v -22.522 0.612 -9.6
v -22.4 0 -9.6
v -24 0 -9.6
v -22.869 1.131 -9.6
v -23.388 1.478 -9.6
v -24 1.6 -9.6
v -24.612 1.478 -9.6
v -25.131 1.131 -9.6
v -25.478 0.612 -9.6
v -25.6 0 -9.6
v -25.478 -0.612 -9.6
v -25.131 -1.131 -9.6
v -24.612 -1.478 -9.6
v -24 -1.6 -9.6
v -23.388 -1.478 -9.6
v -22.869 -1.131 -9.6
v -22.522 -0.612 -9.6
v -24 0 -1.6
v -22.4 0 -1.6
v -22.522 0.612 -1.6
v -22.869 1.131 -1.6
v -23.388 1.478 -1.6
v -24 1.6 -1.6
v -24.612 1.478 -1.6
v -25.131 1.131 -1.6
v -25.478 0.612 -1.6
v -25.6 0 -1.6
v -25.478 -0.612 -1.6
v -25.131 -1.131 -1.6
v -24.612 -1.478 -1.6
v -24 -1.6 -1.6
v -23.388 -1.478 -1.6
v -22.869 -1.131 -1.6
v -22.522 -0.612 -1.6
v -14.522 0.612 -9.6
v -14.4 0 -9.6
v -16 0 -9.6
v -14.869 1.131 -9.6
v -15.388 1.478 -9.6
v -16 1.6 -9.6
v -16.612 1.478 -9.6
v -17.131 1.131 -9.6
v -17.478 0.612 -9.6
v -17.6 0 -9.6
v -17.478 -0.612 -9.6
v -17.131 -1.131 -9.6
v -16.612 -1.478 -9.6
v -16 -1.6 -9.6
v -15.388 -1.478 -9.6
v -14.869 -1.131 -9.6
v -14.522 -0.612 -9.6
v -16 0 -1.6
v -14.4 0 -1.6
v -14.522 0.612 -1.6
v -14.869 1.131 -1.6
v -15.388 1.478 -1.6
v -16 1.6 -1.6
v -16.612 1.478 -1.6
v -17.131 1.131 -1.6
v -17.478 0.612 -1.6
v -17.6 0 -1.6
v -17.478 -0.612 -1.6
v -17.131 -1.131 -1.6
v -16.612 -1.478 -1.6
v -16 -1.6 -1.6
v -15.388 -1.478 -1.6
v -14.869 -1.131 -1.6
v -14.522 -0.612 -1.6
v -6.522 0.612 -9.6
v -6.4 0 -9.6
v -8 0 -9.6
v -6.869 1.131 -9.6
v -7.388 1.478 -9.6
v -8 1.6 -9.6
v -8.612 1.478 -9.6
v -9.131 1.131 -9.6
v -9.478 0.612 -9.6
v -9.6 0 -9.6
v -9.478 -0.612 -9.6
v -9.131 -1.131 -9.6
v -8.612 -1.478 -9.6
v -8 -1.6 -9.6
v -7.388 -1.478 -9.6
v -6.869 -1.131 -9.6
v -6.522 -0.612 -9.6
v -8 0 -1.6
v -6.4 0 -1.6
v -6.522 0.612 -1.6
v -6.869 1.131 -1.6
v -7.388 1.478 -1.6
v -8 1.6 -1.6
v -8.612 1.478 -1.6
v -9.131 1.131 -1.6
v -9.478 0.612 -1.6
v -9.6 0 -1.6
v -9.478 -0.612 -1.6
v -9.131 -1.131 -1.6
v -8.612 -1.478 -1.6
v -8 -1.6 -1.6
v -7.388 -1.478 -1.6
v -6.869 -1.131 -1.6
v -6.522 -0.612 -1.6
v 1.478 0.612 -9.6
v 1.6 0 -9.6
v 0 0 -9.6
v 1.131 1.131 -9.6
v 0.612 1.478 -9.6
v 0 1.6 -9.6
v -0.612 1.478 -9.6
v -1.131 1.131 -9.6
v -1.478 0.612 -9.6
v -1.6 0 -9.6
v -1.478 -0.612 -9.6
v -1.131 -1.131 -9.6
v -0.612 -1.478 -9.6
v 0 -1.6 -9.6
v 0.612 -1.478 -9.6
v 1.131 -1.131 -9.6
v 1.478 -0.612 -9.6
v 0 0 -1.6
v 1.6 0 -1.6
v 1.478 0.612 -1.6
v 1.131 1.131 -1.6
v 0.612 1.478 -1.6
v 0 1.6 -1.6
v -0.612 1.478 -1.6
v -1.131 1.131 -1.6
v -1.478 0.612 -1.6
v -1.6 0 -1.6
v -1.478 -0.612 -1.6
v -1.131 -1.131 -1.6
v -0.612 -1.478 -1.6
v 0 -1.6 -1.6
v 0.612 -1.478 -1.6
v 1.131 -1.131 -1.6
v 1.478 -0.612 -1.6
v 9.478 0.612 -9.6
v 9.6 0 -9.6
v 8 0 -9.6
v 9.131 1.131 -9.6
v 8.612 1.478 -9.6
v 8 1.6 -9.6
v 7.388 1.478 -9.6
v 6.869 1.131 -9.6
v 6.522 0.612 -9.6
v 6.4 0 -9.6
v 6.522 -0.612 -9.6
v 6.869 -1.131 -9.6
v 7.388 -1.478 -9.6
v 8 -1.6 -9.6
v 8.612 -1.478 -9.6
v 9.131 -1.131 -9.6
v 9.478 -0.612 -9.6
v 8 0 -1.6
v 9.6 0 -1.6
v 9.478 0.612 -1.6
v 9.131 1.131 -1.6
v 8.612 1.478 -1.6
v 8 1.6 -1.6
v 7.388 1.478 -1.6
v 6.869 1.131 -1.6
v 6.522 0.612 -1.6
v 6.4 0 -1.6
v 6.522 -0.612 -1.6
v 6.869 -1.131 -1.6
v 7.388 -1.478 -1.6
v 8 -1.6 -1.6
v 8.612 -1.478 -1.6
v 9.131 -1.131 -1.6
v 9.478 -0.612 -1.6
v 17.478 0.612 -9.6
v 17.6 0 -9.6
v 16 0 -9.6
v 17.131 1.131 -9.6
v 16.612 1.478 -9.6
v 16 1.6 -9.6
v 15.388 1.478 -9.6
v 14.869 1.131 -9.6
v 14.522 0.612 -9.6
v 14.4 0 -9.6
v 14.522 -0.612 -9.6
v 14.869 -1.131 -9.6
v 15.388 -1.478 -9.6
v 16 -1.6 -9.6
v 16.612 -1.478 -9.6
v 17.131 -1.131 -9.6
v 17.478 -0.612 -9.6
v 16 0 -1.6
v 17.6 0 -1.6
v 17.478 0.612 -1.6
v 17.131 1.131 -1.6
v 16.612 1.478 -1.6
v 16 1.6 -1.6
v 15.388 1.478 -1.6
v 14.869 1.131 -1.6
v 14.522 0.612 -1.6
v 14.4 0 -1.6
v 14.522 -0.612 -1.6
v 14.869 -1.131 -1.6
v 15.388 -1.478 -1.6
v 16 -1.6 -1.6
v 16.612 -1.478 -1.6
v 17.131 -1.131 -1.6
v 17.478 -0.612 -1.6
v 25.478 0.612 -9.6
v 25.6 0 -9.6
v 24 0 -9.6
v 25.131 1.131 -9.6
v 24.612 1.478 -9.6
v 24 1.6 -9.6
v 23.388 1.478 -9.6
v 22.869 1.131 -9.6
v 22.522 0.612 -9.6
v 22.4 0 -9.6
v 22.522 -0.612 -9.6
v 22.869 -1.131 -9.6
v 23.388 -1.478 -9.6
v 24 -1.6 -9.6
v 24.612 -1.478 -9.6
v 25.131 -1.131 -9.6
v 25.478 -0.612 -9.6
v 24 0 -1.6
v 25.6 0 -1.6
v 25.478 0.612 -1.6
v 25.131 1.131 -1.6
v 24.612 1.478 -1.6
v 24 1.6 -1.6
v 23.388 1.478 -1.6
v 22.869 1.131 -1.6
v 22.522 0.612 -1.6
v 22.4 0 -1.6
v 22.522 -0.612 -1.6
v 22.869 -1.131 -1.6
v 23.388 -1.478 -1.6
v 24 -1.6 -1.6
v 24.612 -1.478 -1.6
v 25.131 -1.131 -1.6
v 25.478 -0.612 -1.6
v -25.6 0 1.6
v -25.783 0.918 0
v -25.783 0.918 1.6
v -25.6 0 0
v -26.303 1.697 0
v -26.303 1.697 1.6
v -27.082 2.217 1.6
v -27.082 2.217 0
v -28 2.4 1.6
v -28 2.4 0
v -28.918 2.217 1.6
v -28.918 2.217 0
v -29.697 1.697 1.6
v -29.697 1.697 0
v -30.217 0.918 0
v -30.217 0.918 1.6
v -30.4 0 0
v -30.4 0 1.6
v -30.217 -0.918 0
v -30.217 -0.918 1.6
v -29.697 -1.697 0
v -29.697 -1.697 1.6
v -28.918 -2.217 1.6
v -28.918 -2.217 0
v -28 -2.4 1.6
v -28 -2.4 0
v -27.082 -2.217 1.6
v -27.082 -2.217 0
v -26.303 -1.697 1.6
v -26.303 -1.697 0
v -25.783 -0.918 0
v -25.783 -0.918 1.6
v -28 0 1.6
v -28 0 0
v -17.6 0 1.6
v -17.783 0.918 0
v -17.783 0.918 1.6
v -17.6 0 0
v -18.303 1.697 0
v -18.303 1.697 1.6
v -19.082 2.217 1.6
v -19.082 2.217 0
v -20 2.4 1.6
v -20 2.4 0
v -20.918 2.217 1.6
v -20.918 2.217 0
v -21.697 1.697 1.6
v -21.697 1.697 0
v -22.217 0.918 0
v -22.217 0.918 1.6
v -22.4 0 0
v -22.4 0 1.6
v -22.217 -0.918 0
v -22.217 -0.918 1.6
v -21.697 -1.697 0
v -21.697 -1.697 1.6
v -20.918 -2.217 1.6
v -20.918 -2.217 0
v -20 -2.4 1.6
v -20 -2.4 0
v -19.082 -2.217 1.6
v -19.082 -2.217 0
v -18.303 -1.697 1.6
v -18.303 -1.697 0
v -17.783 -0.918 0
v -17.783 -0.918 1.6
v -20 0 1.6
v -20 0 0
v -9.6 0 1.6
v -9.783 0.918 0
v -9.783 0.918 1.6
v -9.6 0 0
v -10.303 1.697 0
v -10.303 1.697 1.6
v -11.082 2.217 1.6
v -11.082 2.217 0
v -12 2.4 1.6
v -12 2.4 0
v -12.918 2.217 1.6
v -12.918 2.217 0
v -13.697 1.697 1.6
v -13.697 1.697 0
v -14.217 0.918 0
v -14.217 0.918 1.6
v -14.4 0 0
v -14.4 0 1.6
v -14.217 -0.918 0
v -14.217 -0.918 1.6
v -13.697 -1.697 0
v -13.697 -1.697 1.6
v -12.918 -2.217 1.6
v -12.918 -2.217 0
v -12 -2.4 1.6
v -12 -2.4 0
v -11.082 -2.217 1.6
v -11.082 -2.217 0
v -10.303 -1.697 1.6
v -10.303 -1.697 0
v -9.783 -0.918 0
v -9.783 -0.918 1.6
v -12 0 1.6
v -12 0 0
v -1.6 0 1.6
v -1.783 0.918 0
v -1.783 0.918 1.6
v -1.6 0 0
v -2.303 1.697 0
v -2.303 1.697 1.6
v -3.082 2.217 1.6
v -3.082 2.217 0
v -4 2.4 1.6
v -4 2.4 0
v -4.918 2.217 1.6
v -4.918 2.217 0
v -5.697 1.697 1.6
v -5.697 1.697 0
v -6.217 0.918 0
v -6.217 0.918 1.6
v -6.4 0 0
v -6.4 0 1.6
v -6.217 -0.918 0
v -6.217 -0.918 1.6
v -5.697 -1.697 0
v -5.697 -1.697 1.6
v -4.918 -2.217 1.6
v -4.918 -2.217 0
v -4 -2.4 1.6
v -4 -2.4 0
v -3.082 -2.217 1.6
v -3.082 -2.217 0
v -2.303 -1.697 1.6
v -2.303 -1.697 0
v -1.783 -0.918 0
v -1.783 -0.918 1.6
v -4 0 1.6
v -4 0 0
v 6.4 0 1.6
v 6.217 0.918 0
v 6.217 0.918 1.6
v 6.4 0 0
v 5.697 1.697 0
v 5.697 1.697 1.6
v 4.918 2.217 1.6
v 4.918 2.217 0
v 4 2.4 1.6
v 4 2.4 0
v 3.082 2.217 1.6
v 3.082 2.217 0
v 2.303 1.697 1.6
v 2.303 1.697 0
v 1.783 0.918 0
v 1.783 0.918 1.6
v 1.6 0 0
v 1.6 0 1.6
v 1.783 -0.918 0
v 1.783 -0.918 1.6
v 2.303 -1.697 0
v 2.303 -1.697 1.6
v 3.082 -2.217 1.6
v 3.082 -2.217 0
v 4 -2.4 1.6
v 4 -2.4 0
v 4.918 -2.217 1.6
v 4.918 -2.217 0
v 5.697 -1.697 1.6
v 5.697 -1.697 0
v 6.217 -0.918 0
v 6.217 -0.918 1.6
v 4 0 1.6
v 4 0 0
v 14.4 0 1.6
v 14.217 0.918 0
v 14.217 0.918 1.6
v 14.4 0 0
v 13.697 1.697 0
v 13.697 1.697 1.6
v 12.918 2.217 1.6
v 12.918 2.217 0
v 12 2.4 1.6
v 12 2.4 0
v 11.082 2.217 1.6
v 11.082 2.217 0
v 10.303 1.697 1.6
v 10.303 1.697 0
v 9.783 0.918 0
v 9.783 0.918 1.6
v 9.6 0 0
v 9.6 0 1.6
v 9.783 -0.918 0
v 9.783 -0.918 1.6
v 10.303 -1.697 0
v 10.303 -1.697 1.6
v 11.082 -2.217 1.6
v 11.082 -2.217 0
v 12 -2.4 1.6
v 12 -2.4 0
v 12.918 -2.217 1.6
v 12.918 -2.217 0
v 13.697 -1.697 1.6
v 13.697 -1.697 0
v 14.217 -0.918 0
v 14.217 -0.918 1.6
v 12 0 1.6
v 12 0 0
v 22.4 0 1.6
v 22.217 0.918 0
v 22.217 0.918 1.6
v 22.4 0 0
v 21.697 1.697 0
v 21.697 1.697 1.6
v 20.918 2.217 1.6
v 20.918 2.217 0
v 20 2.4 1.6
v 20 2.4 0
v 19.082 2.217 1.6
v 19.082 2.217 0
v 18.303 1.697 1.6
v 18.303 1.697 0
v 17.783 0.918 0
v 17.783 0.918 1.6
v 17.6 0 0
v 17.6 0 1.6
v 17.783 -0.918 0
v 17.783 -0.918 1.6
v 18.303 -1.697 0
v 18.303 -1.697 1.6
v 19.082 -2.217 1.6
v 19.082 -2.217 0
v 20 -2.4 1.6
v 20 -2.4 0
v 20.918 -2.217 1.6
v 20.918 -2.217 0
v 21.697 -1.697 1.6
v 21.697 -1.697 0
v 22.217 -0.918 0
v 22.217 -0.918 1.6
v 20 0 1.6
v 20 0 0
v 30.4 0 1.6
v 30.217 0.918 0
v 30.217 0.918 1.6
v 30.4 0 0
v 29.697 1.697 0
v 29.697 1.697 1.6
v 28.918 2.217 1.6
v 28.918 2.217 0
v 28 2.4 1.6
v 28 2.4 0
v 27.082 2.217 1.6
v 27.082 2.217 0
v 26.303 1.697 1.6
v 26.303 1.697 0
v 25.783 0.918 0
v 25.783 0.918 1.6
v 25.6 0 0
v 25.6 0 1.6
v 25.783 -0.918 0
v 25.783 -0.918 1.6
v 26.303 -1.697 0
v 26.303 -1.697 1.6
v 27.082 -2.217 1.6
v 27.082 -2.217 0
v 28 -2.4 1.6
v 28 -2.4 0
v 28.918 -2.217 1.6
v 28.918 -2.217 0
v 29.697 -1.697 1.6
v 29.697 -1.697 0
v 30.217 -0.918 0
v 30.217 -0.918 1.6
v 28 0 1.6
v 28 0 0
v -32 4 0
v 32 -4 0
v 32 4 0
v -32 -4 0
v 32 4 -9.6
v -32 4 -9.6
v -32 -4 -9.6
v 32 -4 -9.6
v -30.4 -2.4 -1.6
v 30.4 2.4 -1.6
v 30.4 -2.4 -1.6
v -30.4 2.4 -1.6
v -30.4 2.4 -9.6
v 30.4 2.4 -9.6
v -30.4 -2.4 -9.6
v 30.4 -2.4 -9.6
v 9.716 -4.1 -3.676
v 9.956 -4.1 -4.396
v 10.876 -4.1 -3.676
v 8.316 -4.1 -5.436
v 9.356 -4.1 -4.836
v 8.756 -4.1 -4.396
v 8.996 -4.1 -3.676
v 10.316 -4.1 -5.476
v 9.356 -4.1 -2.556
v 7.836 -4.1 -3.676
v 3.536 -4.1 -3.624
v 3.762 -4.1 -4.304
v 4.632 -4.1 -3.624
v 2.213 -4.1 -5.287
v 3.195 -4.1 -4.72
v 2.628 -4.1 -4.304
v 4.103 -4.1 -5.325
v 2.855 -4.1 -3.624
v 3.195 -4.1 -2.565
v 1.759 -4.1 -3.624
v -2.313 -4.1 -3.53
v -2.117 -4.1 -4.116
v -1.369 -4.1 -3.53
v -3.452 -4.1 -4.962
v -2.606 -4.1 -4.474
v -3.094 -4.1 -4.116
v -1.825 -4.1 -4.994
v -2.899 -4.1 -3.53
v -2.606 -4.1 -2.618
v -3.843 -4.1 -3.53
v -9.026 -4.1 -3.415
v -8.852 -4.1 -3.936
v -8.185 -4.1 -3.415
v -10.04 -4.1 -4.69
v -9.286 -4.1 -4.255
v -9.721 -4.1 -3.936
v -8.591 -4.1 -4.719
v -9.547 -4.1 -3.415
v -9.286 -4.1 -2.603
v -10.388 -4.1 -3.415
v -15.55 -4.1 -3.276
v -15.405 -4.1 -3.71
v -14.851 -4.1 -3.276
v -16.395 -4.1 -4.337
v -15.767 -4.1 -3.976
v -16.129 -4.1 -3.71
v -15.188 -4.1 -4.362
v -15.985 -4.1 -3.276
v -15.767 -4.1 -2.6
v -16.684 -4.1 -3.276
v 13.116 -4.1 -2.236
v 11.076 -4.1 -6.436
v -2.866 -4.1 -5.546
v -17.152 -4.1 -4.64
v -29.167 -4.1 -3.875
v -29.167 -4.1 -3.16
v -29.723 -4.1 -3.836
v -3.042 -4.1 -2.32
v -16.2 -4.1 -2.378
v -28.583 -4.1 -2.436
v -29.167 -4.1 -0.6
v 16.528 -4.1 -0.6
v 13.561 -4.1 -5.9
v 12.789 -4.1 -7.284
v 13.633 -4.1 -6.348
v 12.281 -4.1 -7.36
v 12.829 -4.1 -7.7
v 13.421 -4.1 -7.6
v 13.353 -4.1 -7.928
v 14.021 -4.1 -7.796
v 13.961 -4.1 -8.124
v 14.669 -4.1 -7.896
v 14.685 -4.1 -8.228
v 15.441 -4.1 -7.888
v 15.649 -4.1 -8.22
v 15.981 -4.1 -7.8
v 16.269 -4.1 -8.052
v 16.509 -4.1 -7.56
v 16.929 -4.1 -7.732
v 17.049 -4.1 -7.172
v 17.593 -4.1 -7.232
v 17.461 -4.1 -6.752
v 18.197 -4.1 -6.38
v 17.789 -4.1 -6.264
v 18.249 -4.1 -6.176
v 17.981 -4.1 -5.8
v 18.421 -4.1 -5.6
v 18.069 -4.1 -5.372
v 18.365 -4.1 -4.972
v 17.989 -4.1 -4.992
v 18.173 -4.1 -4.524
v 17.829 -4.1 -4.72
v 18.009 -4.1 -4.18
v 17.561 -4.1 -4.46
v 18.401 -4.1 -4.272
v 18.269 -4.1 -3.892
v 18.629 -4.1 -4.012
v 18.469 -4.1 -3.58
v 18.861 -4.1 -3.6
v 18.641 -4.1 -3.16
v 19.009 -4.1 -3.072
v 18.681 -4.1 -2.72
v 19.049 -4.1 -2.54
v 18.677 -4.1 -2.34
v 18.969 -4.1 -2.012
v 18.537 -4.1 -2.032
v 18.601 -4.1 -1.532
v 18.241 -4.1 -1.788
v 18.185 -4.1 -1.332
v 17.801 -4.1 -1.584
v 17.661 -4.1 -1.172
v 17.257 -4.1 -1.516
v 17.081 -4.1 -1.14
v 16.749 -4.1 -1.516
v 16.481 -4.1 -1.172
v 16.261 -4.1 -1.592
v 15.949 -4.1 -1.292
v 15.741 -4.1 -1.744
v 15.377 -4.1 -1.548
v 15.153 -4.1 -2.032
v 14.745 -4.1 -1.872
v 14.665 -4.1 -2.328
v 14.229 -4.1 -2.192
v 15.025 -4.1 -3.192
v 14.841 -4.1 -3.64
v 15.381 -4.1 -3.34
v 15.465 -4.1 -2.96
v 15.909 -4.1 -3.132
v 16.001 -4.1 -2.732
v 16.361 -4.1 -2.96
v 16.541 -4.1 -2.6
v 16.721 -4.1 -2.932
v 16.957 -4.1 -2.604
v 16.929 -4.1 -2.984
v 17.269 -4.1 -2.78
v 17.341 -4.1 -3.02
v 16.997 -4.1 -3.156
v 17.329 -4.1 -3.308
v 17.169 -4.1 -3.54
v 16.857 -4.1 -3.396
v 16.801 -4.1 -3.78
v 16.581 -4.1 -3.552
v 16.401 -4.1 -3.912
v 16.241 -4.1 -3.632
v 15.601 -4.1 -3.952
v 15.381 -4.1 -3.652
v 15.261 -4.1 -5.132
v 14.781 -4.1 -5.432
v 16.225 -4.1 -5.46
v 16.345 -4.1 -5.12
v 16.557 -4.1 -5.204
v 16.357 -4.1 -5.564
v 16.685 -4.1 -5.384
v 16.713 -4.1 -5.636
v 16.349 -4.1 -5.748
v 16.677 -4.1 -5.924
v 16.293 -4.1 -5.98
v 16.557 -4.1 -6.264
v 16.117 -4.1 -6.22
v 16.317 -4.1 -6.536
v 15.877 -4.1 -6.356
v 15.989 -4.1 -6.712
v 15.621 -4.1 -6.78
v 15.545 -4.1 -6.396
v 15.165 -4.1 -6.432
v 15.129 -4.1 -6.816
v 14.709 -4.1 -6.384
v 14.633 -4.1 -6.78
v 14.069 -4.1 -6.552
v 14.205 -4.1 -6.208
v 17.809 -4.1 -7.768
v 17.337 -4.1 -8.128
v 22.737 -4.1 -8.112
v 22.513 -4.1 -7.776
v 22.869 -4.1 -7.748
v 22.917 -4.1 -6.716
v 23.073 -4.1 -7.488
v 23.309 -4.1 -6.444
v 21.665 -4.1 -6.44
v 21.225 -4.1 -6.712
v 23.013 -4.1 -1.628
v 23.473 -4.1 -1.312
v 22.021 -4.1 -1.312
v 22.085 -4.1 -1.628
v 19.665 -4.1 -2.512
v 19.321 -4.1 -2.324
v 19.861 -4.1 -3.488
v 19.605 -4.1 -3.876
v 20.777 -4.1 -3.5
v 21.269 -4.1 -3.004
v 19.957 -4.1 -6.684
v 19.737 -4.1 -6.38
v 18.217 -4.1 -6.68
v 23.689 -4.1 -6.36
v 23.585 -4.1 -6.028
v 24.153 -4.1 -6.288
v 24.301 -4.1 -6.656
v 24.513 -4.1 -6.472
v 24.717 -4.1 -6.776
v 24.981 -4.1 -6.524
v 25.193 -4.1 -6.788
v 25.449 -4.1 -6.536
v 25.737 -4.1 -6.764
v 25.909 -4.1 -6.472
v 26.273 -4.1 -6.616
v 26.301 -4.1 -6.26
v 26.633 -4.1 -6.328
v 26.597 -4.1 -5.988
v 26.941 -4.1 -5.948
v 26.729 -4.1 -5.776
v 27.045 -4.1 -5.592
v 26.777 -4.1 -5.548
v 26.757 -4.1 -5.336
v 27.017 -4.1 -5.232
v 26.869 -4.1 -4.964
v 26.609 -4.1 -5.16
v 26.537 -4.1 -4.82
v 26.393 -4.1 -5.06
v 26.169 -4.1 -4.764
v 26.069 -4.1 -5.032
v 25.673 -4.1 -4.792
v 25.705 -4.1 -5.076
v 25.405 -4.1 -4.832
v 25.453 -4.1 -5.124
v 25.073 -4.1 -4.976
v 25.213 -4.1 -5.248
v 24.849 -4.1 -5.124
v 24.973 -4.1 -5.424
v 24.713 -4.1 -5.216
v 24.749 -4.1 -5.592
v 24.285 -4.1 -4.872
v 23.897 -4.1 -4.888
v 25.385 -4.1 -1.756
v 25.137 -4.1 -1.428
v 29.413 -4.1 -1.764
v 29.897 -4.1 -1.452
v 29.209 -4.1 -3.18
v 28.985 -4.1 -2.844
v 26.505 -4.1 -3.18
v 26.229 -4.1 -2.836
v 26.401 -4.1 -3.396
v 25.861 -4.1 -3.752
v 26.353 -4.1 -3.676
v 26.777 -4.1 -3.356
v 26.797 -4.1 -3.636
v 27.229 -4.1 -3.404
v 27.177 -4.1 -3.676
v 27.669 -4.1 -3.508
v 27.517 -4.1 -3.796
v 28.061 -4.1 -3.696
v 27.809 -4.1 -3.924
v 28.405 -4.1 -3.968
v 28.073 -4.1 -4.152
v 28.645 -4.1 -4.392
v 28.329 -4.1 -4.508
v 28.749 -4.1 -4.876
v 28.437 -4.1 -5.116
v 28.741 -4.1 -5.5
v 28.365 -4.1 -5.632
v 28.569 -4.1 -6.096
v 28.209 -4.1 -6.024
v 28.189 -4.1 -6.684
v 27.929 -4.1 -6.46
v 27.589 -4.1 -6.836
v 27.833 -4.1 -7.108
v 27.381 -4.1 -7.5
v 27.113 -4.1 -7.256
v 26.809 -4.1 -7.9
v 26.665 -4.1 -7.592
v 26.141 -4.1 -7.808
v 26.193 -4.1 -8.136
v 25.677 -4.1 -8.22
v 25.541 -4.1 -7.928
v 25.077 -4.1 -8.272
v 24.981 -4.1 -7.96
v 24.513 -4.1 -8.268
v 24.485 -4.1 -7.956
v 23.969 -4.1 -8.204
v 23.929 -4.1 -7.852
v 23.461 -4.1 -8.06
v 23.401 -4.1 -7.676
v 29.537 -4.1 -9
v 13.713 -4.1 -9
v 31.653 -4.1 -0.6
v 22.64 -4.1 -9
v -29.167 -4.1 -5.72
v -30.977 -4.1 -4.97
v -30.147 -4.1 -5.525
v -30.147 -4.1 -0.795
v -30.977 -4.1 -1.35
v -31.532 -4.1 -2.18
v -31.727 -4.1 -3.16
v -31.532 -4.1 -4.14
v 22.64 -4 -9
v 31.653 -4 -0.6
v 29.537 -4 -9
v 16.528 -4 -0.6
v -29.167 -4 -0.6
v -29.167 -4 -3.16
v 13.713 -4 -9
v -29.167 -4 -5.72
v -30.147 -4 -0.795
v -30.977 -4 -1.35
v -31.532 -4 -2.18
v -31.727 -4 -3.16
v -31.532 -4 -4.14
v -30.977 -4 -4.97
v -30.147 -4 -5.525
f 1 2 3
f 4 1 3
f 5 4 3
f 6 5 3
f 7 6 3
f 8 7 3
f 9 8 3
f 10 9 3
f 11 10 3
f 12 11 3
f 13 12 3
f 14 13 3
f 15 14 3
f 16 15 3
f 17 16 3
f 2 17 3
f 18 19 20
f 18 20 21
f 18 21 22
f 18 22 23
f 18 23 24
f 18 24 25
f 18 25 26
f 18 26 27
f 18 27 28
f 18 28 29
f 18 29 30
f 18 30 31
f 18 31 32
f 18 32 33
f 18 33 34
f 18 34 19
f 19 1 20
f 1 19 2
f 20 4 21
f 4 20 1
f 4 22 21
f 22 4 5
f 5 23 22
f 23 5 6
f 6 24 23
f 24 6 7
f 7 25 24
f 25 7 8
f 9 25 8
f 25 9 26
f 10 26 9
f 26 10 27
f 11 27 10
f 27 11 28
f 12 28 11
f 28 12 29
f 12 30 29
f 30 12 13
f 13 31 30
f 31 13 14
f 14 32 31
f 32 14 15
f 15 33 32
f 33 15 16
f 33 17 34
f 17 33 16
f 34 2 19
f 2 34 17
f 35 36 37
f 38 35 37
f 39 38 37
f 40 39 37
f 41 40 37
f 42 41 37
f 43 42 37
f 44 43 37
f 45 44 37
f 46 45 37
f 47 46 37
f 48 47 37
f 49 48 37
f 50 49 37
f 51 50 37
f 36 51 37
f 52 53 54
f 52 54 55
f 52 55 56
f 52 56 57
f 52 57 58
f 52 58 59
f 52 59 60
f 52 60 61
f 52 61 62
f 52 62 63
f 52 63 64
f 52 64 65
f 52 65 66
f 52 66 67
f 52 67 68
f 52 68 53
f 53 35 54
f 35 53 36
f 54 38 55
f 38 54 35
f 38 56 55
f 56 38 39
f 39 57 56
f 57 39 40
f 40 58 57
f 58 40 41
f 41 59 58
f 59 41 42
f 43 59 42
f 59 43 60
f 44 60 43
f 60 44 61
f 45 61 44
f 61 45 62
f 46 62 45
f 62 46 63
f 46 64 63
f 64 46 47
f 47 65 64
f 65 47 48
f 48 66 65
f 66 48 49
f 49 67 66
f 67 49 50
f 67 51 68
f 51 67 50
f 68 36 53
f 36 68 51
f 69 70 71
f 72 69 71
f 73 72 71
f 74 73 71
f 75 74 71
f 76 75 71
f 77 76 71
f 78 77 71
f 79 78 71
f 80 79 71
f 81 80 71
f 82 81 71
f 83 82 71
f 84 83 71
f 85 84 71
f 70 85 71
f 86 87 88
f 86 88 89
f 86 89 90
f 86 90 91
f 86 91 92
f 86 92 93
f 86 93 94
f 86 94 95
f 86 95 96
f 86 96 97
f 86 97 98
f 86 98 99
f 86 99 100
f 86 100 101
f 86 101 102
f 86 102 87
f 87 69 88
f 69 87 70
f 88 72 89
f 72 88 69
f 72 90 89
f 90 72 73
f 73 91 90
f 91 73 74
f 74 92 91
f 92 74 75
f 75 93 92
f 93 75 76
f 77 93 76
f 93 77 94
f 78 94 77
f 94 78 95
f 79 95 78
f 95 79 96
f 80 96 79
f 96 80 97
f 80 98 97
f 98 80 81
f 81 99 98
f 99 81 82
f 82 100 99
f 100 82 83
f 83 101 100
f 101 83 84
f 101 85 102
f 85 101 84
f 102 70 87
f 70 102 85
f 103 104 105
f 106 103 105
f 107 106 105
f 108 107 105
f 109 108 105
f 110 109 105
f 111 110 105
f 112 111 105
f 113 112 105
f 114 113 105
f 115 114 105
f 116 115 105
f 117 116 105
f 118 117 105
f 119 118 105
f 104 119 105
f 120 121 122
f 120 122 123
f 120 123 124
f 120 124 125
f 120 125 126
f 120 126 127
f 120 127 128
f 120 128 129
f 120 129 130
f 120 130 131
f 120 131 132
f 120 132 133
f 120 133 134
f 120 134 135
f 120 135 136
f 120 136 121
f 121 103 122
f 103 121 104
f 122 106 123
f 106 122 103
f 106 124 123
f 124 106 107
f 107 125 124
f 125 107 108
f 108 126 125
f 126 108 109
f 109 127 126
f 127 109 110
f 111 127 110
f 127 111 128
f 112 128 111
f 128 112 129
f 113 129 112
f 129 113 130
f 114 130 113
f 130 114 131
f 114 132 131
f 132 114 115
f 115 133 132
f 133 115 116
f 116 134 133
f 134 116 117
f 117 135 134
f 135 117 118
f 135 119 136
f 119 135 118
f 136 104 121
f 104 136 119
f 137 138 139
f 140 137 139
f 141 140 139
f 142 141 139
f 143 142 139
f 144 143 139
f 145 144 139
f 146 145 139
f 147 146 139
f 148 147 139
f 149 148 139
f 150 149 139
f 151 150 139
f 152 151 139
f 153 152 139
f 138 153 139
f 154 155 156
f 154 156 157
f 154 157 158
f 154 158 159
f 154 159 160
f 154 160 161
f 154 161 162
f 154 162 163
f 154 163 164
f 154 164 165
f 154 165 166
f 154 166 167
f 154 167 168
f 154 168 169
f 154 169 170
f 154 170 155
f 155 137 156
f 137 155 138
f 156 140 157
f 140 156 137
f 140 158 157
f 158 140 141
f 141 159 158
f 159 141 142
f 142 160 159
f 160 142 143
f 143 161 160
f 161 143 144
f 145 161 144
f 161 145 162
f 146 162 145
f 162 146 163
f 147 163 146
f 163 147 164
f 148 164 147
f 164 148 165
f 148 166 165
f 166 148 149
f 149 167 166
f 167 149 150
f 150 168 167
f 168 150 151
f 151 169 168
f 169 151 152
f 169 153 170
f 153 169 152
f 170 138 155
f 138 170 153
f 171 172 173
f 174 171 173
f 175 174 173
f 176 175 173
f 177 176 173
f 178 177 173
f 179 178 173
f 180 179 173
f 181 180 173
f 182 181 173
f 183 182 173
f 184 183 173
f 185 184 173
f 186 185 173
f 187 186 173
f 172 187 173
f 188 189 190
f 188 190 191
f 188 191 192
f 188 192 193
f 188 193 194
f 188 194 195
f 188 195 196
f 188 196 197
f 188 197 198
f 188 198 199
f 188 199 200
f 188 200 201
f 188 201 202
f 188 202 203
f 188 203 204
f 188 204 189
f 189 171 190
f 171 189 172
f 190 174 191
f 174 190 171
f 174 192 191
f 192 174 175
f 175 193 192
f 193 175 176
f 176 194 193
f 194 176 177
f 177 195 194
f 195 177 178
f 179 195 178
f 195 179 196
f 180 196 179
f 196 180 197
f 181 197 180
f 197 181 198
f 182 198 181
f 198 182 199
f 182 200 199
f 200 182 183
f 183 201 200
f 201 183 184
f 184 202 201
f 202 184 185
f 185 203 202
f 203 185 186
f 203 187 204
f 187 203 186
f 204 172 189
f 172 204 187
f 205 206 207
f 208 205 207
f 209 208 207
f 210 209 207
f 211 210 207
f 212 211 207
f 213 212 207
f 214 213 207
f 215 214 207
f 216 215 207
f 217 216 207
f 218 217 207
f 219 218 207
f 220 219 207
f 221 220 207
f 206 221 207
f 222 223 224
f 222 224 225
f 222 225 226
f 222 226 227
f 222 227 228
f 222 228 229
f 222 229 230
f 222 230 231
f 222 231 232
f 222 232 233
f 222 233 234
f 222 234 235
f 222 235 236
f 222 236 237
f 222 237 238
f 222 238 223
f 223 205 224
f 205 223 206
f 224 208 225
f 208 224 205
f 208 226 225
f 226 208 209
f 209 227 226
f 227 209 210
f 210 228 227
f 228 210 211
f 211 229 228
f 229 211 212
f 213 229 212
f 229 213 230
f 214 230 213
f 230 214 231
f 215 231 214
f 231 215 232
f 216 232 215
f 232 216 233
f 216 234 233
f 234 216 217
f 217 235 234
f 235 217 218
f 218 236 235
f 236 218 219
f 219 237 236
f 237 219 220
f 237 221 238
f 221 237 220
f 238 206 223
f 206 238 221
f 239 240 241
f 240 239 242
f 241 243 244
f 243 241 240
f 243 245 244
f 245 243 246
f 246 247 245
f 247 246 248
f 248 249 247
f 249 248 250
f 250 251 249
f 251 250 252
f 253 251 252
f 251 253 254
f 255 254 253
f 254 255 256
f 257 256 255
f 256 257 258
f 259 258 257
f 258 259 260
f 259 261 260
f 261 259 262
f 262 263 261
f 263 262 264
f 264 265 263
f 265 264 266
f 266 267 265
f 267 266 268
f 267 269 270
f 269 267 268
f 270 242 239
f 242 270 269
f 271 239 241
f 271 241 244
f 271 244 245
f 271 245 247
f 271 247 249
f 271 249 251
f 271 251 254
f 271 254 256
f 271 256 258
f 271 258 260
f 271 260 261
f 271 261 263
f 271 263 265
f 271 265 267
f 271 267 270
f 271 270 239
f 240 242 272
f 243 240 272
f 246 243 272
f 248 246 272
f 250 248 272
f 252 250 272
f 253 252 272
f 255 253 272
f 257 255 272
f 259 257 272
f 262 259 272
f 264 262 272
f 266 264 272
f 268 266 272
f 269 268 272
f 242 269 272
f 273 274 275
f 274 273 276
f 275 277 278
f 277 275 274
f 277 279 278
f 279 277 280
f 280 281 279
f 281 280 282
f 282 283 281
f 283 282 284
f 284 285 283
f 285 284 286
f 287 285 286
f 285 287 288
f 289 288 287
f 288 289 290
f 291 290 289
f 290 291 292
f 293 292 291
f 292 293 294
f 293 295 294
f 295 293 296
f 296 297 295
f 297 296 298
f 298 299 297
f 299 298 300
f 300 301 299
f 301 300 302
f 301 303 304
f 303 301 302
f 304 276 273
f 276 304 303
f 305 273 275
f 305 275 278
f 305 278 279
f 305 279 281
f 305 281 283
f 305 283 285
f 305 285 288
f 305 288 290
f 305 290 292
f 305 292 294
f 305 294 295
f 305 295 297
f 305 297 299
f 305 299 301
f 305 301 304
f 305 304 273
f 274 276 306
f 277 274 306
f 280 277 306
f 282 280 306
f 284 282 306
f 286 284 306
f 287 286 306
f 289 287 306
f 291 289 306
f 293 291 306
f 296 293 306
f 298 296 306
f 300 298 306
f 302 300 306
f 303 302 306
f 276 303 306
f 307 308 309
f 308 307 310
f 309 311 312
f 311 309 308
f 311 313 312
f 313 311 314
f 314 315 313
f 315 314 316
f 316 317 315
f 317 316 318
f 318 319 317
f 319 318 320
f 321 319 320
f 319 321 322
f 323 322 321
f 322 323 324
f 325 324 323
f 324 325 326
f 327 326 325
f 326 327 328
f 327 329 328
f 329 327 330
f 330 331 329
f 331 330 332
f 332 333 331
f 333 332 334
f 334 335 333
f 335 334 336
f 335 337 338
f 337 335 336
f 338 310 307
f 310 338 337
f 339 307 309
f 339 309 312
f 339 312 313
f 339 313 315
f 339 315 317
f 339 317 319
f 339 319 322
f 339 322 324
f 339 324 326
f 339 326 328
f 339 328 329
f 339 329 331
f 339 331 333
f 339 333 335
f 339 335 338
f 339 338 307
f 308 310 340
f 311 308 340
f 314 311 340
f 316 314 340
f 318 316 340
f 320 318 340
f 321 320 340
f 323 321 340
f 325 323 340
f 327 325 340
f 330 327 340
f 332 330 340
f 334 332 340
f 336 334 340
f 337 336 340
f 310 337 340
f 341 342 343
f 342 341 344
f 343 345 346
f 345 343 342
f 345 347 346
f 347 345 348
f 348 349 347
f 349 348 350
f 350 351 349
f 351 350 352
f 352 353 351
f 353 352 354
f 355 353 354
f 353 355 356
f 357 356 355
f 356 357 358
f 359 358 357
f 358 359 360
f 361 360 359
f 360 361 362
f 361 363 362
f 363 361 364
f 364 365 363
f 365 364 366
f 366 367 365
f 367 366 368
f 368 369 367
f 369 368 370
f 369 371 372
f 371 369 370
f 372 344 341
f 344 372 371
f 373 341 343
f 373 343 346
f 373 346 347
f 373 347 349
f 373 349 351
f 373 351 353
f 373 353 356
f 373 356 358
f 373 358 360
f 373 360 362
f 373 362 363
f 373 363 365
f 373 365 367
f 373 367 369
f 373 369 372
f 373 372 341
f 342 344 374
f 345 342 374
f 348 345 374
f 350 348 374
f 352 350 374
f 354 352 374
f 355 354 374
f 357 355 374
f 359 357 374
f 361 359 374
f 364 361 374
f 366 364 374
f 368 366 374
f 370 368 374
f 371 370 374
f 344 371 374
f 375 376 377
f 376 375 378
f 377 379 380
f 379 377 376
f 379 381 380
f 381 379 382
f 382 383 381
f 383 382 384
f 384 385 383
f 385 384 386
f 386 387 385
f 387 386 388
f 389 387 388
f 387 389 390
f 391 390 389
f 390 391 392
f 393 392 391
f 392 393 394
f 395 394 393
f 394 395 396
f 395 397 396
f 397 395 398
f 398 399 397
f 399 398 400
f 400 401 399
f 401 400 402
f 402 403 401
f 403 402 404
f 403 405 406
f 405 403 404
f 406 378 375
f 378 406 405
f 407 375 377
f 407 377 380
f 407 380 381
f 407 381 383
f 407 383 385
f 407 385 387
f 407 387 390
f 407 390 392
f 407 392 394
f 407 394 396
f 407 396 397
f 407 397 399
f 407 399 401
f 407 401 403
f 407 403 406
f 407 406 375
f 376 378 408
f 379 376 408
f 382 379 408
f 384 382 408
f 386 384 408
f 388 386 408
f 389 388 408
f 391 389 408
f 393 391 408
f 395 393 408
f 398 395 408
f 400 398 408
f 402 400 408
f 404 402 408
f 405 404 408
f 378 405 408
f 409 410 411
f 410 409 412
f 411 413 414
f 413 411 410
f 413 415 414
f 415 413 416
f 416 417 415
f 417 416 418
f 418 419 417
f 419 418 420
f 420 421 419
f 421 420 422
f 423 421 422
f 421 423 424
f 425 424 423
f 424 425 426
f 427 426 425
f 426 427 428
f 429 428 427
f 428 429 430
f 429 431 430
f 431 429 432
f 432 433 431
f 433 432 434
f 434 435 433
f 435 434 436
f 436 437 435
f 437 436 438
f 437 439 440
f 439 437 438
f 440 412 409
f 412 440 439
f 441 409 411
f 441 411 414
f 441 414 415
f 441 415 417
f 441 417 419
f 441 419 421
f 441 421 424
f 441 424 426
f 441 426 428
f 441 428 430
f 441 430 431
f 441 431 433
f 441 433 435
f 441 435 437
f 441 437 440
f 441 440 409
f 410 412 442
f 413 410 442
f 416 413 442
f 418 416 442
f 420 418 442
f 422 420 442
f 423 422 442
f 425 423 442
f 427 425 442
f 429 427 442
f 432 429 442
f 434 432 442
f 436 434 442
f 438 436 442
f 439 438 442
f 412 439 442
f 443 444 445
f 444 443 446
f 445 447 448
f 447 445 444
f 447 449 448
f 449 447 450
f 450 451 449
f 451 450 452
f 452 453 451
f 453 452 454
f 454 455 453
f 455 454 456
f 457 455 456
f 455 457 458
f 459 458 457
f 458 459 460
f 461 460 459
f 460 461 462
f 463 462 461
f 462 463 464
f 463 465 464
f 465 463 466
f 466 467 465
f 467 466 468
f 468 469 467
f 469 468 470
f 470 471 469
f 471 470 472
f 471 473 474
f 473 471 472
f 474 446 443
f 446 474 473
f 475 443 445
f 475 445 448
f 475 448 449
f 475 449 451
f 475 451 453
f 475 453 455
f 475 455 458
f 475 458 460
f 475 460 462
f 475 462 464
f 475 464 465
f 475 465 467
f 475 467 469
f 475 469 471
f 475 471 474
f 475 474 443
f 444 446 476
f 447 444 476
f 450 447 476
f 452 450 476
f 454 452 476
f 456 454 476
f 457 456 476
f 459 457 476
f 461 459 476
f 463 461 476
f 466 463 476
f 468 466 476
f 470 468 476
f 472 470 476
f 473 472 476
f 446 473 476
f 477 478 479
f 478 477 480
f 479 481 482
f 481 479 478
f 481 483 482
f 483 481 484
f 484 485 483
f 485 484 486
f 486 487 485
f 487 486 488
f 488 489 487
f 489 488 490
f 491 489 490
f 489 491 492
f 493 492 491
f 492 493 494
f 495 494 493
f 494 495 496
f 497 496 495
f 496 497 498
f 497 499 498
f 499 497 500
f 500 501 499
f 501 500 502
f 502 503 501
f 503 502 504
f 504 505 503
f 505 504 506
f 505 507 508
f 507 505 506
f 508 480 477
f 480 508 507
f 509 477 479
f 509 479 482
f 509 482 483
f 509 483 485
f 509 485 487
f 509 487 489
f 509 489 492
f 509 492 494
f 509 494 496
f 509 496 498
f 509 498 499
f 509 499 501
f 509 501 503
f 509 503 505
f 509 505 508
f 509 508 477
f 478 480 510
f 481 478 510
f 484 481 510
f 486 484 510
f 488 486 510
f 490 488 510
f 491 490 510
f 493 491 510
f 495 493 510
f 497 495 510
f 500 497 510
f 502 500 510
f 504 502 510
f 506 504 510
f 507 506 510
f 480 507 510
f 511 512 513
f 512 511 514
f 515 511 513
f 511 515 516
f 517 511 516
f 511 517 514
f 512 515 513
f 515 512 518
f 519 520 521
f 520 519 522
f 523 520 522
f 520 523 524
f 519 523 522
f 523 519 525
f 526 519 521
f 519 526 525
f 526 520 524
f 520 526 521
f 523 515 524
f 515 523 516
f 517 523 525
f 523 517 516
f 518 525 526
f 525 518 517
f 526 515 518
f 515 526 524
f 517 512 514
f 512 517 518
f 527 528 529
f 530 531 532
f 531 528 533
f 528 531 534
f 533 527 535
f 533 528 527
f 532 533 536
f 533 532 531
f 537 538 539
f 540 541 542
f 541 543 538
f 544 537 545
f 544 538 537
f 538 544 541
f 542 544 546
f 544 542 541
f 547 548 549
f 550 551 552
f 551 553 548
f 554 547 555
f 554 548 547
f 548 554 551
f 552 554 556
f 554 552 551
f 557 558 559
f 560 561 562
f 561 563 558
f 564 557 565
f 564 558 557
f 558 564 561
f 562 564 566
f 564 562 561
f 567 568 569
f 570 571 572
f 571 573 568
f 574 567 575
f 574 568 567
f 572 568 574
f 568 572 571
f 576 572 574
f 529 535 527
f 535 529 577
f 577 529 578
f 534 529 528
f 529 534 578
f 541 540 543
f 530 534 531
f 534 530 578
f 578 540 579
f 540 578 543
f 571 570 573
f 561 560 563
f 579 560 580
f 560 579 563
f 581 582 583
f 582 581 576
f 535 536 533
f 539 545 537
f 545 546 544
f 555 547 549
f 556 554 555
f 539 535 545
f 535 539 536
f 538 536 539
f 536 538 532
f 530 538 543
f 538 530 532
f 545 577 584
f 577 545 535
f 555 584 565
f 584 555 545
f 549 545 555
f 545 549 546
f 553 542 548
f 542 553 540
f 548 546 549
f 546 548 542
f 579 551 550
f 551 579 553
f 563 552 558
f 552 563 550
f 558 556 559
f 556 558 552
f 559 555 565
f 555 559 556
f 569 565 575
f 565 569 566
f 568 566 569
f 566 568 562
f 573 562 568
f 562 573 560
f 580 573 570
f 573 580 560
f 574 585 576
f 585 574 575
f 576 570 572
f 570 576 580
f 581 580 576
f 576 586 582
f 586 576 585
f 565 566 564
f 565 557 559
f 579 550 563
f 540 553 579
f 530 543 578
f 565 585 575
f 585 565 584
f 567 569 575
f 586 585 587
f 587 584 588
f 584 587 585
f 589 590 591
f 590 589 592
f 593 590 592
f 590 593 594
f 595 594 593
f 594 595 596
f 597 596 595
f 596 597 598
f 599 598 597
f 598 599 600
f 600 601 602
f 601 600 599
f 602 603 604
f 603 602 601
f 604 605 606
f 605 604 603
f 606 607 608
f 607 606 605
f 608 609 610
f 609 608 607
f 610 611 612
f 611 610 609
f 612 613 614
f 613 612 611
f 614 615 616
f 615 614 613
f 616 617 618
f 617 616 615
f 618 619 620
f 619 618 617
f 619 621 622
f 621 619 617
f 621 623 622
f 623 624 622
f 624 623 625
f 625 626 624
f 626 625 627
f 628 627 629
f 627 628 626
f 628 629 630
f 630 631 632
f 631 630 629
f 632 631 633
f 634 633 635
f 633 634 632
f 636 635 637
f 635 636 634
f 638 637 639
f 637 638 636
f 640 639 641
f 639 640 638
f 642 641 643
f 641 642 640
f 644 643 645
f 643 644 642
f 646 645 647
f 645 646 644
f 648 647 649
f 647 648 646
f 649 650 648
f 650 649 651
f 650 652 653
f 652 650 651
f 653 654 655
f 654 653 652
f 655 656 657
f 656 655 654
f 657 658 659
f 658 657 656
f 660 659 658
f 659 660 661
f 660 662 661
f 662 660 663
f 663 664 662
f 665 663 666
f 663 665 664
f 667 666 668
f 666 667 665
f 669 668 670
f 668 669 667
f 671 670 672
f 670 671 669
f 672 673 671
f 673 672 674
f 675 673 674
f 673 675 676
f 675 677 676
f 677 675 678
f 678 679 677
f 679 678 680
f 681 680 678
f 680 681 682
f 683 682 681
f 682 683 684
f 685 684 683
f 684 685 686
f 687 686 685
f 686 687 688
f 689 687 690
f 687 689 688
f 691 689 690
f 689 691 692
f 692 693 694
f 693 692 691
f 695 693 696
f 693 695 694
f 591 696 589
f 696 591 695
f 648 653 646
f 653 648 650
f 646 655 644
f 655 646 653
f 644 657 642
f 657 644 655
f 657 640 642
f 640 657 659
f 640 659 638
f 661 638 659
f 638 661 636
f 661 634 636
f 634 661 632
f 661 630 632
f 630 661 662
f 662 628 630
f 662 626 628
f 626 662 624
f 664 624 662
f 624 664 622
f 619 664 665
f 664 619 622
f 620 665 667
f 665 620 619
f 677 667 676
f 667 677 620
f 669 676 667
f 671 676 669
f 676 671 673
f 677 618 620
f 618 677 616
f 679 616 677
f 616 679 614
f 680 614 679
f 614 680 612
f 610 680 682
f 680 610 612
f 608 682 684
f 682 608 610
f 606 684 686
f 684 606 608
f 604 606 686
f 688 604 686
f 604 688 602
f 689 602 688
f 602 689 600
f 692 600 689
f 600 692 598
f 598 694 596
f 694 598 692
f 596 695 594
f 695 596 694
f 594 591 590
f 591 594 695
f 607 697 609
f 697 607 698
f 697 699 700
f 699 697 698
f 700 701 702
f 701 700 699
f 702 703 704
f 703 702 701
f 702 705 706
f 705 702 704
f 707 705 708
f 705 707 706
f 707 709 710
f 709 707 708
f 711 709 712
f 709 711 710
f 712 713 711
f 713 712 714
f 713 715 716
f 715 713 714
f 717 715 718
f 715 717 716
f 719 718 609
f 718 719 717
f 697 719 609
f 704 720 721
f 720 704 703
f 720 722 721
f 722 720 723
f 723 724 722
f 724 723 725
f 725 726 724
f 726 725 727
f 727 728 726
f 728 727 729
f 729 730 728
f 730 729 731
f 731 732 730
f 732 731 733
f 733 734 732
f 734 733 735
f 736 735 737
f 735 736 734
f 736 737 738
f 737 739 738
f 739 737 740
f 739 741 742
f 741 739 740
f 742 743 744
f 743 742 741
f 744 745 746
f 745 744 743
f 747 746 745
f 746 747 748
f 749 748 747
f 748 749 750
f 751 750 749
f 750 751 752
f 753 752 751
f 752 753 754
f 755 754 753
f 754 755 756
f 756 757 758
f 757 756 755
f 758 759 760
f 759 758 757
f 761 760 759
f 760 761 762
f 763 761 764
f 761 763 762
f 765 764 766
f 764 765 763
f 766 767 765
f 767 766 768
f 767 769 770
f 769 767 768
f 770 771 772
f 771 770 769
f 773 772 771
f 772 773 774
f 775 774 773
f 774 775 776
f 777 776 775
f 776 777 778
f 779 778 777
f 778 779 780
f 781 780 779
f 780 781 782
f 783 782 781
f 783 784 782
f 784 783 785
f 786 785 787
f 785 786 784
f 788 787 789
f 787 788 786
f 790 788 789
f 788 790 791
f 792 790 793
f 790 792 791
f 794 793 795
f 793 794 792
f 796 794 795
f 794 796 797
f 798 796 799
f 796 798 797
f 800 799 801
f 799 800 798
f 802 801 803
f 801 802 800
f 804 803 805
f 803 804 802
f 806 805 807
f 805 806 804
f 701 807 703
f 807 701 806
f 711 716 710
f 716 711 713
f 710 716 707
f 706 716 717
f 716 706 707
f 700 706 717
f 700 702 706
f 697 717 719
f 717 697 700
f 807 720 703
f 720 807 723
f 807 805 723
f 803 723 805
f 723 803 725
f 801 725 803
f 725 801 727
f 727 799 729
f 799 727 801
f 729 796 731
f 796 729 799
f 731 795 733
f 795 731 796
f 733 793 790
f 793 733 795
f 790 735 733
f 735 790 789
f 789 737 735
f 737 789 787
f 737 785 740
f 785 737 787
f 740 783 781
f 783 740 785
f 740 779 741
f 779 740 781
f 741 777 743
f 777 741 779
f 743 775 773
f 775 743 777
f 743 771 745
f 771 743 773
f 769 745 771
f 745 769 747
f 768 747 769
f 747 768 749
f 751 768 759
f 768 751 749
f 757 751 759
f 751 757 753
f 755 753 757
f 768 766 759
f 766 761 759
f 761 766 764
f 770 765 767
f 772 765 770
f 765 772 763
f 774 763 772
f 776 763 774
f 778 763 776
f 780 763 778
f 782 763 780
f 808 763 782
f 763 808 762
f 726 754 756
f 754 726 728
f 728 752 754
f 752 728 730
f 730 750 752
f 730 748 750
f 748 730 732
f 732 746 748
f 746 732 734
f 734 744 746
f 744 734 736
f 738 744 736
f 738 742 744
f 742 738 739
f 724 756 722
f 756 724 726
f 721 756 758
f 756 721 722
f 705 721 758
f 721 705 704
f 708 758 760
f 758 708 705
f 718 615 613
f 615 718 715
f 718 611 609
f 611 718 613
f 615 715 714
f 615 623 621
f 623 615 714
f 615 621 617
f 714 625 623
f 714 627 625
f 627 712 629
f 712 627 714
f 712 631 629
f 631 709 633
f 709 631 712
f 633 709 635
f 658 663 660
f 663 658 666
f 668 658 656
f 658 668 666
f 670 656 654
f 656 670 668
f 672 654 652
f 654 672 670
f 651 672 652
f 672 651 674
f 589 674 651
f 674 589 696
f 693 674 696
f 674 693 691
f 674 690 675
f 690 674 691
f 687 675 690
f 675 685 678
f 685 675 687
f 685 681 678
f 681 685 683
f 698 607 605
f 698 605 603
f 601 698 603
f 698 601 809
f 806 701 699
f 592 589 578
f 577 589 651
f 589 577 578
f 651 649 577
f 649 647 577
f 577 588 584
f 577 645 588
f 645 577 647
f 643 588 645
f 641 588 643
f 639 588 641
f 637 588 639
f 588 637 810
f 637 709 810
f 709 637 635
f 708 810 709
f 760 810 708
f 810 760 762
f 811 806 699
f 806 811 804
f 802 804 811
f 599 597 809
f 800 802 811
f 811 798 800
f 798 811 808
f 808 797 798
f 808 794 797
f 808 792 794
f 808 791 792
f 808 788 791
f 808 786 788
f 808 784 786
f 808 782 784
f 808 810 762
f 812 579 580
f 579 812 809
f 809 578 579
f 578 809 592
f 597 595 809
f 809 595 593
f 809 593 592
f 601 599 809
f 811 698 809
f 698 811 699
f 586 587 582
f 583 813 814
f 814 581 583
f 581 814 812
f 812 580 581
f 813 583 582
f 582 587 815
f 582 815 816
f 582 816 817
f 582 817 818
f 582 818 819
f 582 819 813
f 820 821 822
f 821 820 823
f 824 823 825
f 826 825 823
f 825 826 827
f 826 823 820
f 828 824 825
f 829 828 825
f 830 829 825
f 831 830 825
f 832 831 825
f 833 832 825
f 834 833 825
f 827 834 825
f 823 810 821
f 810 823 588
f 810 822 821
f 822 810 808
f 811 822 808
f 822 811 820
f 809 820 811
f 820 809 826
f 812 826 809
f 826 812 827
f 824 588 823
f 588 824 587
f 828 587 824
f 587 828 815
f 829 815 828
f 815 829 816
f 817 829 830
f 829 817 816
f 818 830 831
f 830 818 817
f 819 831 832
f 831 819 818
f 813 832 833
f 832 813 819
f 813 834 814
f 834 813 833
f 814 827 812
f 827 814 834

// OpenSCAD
use <../lib.scad>
use <169595b.scad>
use <3008.scad>
function ldraw_lib__3008d11() = [
// 0 Brick  1 x  8 with "315" and Red Stripe with Stars - Left Sticker
// 0 Name: 3008d11.dat
// 0 Author: Takeshi Takahashi [RainbowDolphin]
// 0 !LDRAW_ORG Shortcut UPDATE 2026-08
// 0 !LICENSE Licensed under CC BY 4.0 : see CAreadme.txt
// 
// 0 BFC CERTIFY CCW
  [0,"BFC","CERTIFY"],
  [0,"BFC","CCW"],
// 
// 0 !CATEGORY Sticker Shortcut
// 0 !KEYWORDS Bricklink 3008pb051R, Set 6596, Speedboat, Wave Master
// 
// 0 !HISTORY 2026-08-31 [OrionP] Official Update 2026-08
// 
// 1 16 0 0 0 1 0 0 0 1 0 0 0 1 3008.dat
  [1,16,0,0,0,1,0,0,0,1,0,0,0,1, ldraw_lib__3008()],
// 1 16 0 12 -10 1 0 0 0 0 -1 0 1 0 169595b.dat
  [1,16,0,12,-10,1,0,0,0,0,-1,0,1,0, ldraw_lib__169595b()],
];
module ldraw_lib__3008d11(step=0, col=false, unit=2/5, alt=false, line=0.2, solid=!$preview)
    makepoly(ldraw_lib__3008d11(), step=step, col=col, unit=unit, alt=alt, line=line, solid=solid);
ldraw_lib__3008d11(line=0.2);
